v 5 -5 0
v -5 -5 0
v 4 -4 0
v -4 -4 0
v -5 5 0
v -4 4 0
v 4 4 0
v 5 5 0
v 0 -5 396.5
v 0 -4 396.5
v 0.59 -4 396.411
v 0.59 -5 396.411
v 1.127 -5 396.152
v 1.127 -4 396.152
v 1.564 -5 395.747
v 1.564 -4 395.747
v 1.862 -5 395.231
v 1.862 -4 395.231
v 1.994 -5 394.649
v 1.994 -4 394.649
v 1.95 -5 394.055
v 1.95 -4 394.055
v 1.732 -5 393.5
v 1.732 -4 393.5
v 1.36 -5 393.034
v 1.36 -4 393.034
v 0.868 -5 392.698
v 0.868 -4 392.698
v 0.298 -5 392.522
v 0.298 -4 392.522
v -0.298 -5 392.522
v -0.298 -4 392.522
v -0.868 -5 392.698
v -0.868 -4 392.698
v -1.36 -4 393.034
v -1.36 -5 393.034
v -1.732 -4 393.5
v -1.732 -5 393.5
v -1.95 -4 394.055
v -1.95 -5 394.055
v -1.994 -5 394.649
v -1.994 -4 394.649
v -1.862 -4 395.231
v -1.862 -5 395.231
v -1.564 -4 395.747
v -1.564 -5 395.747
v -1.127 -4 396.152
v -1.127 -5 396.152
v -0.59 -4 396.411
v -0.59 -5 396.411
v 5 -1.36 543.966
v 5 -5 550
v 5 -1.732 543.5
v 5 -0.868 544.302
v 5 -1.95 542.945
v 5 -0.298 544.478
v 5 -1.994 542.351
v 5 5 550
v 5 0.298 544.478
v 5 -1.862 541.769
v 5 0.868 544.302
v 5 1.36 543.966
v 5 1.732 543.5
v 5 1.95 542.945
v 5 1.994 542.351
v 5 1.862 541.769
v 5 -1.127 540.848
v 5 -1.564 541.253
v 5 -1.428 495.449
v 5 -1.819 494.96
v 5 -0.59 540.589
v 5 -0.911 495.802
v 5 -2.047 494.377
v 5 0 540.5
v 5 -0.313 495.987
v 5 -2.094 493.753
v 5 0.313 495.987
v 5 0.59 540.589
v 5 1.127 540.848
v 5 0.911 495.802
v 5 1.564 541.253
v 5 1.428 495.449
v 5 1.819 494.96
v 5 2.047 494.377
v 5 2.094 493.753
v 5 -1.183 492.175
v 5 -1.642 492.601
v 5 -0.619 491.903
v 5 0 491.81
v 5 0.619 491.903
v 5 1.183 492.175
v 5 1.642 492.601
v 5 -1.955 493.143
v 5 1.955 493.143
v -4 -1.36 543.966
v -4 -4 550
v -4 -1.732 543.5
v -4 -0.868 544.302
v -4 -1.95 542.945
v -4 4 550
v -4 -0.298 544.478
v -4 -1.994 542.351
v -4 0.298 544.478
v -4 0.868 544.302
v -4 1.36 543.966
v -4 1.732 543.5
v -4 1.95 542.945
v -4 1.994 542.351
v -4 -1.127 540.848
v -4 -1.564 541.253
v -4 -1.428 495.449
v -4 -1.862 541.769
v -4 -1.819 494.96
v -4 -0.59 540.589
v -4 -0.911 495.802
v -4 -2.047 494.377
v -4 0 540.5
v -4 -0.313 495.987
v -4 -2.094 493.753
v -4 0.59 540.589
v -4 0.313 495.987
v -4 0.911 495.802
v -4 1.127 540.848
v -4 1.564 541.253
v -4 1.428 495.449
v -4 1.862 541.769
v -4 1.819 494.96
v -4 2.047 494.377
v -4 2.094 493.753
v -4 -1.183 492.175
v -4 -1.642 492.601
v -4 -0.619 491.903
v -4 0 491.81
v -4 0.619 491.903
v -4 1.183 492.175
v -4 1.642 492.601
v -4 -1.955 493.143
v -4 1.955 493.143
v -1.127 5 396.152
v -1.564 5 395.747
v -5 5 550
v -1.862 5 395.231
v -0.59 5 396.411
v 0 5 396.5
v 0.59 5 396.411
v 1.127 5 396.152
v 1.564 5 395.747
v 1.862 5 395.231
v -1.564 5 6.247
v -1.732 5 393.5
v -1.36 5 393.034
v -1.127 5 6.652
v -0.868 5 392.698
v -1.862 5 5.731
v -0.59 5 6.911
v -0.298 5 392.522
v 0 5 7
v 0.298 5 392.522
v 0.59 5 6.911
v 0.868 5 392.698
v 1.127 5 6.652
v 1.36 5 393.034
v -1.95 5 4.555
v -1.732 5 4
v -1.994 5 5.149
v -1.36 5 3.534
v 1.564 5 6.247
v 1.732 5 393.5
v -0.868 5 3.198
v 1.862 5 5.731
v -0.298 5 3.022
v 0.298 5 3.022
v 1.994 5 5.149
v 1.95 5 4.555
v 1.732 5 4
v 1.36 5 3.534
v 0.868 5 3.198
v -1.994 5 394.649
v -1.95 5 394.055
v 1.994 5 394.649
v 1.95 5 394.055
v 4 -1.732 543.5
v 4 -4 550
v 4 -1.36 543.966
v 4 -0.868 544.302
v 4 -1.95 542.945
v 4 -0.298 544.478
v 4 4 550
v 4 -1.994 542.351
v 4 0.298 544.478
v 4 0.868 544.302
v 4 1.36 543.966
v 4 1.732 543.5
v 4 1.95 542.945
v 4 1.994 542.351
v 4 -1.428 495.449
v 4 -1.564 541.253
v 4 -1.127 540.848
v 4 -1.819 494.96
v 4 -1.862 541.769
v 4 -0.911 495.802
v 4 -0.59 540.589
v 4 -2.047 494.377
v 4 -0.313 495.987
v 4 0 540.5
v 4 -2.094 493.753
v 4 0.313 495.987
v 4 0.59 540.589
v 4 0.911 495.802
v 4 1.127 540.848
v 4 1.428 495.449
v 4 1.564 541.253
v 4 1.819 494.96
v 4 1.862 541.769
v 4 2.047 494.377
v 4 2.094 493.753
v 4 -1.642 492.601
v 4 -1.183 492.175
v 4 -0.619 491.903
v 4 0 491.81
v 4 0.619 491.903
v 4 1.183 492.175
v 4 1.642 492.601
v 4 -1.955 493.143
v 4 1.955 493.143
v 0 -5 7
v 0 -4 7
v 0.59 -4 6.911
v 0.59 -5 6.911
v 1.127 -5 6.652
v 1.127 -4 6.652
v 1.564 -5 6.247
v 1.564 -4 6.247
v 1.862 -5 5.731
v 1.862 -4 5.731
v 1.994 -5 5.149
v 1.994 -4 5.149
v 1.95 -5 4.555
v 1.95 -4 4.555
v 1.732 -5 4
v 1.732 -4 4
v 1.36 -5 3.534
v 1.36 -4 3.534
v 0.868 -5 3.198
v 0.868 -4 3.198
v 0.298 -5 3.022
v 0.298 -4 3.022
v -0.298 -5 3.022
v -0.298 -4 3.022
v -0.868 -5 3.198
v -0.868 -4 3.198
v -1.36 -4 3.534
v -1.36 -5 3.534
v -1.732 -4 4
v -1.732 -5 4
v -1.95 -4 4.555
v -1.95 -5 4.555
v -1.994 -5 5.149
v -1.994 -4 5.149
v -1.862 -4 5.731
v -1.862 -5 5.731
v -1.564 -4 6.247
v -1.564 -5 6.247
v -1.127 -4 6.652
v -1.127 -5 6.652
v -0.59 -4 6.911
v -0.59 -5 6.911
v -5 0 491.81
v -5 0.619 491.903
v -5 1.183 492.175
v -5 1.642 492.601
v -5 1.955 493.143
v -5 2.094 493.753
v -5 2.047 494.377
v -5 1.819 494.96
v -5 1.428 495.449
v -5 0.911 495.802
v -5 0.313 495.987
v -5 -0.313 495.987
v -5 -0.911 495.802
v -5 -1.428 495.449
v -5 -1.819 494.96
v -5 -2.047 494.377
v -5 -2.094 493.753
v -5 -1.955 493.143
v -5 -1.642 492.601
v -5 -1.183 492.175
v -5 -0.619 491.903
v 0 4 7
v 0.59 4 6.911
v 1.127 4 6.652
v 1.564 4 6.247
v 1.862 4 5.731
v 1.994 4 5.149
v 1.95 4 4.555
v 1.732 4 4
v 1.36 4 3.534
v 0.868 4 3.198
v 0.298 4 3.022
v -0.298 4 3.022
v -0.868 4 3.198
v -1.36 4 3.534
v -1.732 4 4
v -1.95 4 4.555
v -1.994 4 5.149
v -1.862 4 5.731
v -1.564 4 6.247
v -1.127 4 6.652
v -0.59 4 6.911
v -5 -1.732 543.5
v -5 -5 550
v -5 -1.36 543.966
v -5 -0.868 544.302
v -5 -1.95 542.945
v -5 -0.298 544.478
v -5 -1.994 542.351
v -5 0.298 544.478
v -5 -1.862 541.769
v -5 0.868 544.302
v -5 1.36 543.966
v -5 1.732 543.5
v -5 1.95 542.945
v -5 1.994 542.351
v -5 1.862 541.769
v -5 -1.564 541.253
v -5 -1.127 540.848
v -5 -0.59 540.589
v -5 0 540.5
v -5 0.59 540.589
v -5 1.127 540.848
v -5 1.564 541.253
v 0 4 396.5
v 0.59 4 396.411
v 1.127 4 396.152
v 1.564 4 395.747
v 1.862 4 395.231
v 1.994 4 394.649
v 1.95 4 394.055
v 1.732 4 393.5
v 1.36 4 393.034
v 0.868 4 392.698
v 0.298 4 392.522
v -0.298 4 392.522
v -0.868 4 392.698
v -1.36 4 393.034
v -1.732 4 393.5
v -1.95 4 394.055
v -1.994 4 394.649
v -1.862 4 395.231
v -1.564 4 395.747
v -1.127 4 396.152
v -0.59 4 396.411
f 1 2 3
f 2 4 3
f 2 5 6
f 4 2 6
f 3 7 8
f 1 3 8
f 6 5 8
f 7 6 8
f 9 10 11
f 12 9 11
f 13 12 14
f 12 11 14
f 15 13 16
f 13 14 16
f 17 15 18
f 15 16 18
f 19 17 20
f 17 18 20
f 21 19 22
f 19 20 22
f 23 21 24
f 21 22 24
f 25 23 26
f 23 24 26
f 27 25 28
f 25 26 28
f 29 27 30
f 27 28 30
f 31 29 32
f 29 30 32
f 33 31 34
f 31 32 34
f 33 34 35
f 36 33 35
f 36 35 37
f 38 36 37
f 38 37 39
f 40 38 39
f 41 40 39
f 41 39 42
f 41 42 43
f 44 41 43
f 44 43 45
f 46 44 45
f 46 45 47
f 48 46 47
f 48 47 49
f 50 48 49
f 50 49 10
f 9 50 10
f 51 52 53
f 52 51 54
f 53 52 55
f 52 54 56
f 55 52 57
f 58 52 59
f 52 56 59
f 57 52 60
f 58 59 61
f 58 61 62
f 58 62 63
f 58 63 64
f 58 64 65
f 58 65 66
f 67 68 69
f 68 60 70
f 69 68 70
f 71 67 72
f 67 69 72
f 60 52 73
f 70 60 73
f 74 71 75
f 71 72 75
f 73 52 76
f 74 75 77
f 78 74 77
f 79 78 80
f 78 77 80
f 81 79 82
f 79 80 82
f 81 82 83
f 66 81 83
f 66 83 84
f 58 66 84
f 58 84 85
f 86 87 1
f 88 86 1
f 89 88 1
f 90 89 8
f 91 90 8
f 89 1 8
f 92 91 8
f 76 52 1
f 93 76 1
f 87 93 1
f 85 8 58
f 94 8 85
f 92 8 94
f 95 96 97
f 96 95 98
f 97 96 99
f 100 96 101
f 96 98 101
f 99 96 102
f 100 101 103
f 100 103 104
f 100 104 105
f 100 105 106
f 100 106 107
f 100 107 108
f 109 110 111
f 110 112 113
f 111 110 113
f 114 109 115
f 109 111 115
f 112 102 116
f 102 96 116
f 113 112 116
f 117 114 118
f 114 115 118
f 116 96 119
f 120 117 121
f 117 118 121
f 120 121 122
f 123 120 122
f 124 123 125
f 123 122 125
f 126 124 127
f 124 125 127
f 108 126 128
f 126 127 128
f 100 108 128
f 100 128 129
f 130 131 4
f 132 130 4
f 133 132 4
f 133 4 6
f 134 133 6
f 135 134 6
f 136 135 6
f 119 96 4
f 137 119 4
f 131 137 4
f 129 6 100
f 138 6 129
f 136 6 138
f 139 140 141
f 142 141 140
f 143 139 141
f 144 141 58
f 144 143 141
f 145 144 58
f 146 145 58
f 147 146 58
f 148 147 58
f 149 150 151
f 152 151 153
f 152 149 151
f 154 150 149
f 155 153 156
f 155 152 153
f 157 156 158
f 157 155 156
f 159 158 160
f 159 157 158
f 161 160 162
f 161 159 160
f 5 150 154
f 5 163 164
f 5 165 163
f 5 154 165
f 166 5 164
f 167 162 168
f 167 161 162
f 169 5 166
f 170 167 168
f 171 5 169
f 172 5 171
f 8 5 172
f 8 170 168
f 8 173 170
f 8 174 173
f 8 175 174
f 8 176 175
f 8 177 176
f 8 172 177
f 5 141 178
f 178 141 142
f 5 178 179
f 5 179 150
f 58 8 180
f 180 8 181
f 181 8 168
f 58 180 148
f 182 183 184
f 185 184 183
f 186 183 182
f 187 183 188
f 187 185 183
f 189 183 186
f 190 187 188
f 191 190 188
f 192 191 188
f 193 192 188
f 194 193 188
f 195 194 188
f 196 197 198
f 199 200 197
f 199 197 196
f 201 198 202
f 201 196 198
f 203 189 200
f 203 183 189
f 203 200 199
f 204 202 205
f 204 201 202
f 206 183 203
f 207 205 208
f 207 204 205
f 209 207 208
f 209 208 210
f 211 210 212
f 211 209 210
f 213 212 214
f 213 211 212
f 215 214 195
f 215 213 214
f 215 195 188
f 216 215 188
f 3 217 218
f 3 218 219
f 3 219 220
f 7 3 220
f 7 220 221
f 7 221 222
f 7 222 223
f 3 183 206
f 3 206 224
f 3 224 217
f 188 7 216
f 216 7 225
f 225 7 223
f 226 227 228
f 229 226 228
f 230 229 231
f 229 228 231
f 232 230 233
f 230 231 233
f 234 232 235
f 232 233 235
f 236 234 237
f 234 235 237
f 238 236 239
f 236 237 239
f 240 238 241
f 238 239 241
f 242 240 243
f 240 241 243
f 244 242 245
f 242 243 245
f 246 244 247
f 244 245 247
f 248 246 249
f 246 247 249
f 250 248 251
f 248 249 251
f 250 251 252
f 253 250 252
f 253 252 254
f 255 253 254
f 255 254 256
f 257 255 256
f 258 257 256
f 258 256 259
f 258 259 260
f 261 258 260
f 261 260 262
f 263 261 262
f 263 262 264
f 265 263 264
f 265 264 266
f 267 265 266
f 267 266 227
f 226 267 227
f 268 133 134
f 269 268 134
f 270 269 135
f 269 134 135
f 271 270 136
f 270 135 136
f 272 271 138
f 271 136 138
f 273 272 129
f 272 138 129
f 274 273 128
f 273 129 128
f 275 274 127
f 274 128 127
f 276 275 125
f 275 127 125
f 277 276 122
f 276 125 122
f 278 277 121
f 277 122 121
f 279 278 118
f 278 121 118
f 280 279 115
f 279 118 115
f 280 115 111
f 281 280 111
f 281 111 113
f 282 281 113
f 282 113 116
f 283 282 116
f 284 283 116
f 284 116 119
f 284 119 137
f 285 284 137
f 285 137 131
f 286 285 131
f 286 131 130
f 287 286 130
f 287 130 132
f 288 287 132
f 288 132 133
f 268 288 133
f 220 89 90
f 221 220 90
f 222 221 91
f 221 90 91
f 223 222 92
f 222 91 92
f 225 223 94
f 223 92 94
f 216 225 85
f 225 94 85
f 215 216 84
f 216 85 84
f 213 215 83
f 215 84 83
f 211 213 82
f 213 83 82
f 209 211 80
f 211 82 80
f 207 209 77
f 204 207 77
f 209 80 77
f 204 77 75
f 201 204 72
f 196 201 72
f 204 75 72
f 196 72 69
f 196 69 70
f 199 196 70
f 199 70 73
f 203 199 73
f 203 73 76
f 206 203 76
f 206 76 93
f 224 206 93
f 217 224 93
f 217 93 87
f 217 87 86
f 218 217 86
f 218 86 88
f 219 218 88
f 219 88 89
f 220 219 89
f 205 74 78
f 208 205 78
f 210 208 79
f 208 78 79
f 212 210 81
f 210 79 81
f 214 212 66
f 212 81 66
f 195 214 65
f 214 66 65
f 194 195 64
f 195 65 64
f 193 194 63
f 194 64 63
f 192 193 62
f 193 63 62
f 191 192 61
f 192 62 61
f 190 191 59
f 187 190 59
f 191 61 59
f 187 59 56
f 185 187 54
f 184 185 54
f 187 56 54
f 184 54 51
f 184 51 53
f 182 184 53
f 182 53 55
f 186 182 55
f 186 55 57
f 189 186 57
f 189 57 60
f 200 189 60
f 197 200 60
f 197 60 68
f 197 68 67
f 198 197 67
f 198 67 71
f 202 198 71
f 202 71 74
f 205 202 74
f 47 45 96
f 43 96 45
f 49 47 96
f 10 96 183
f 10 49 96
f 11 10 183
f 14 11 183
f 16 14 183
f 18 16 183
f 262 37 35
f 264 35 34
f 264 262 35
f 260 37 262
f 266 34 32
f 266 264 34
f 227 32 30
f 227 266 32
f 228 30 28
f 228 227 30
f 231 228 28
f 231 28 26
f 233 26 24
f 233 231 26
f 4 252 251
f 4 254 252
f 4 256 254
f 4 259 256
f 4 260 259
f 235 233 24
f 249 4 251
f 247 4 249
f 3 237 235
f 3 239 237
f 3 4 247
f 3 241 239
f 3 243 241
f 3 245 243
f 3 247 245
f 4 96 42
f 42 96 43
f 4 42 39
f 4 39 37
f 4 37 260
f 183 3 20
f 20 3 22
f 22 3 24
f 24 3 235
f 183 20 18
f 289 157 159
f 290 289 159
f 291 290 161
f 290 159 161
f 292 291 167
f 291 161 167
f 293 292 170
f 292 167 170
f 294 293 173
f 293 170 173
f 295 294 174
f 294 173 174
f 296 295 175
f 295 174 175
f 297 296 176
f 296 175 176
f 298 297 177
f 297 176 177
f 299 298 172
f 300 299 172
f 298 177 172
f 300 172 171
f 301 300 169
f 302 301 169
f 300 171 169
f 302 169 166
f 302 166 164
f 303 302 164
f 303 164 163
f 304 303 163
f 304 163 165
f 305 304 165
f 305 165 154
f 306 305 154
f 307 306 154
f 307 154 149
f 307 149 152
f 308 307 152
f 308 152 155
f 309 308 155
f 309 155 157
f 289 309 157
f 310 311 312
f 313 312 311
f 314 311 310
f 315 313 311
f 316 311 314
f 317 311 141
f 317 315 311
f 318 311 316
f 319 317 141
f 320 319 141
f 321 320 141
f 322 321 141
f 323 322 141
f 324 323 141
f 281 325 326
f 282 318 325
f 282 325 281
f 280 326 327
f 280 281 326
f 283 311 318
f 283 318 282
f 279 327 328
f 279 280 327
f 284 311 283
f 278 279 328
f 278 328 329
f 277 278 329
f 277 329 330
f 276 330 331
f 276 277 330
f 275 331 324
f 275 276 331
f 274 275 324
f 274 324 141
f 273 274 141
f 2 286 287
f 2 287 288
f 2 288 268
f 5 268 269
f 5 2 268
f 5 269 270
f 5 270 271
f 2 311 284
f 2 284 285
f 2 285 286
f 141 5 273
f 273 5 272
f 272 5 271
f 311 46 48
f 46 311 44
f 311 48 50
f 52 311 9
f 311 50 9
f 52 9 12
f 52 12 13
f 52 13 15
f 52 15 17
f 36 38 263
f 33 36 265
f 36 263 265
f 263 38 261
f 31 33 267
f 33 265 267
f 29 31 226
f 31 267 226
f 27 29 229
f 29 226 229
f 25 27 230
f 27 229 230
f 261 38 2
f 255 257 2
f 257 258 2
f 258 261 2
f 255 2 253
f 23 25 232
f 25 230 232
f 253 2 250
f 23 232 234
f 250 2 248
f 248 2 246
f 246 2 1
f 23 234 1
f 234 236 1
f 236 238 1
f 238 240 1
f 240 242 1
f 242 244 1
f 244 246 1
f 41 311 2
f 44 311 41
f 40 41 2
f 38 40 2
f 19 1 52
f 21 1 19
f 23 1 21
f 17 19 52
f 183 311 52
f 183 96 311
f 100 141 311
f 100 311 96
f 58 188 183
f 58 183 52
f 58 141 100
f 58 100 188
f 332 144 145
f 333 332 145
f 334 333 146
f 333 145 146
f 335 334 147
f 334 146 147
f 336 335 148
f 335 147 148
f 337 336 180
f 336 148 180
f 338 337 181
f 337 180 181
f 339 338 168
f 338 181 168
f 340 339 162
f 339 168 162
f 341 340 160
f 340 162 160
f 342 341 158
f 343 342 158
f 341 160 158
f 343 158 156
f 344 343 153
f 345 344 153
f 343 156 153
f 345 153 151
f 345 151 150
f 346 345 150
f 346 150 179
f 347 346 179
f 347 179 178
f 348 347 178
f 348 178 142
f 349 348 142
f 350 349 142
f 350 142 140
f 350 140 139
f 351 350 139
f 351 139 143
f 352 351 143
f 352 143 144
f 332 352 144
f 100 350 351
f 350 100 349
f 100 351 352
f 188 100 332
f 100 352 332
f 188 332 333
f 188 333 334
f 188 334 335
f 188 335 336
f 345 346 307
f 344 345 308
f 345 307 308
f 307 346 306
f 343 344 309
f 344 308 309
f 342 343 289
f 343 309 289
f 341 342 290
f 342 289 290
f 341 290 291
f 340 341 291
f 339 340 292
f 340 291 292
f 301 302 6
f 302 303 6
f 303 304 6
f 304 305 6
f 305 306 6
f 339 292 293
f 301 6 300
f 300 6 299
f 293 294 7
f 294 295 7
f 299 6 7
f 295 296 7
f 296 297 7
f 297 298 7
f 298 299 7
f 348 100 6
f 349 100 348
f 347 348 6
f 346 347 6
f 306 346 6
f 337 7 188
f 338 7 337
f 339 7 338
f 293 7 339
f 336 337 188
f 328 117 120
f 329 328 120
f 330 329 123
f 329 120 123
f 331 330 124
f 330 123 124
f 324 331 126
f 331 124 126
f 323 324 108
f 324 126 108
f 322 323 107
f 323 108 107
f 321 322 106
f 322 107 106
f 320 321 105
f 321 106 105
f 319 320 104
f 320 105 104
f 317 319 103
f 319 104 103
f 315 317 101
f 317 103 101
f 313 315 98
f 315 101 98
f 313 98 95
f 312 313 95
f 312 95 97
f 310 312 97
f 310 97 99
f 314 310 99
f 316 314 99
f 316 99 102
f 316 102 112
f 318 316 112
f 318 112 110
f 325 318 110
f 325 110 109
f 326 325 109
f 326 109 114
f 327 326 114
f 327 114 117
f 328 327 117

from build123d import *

# Parameters (mm, degrees)
SKETCH_1_W          = 10
SKETCH_1_H          = 10
SKETCH_1_W_2        = 8
SKETCH_1_H_2        = 8
EXTRUDE_1_DEPTH     = 550
SKETCH_2_R          = 2
CUT_EXTRUDE_1_DEPTH = 551.113624627
SKETCH_3_R          = 2.1
CUT_EXTRUDE_2_DEPTH = 551.113624627
SKETCH_4_R          = 2
CUT_EXTRUDE_3_DEPTH = 551.113624627


with BuildPart() as part:
    # ｽｹｯﾁ1 → 押し出し-薄板1 (new body)
    with BuildSketch(Plane.XY):
        Rectangle(SKETCH_1_W, SKETCH_1_H)
        Rectangle(SKETCH_1_W_2, SKETCH_1_H_2, mode=Mode.SUBTRACT)
    extrude(amount=EXTRUDE_1_DEPTH)

    # ｽｹｯﾁ2 → ｶｯﾄ - 押し出し1 (cut, through all)
    with BuildSketch(Plane(origin=(0, 5, 0), x_dir=(1, 0, 0), z_dir=(0, 1, 0))):
        with Locations(Location((0, -5, 0), (0, 0, 270))):
            Circle(SKETCH_2_R)
        with Locations(Location((0, -394.5, 0), (0, 0, 270))):
            Circle(SKETCH_2_R)
    extrude(amount=-CUT_EXTRUDE_1_DEPTH, mode=Mode.SUBTRACT)

    # ｽｹｯﾁ3 → ｶｯﾄ - 押し出し2 (cut, through all)
    with BuildSketch(Plane(origin=(5, 0, 0), x_dir=(0, 0, -1), z_dir=(1, 0, 0))):
        with Locations((-493.91, 0)):
            Circle(SKETCH_3_R)
    extrude(amount=-CUT_EXTRUDE_2_DEPTH, mode=Mode.SUBTRACT)

    # ｽｹｯﾁ4 → ｶｯﾄ - 押し出し3 (cut, through all)
    with BuildSketch(Plane(origin=(5, 0, 0), x_dir=(0, 0, -1), z_dir=(1, 0, 0))):
        with Locations((-542.5, 0)):
            Circle(SKETCH_4_R)
    extrude(amount=-CUT_EXTRUDE_3_DEPTH, mode=Mode.SUBTRACT)


solid = part.part
